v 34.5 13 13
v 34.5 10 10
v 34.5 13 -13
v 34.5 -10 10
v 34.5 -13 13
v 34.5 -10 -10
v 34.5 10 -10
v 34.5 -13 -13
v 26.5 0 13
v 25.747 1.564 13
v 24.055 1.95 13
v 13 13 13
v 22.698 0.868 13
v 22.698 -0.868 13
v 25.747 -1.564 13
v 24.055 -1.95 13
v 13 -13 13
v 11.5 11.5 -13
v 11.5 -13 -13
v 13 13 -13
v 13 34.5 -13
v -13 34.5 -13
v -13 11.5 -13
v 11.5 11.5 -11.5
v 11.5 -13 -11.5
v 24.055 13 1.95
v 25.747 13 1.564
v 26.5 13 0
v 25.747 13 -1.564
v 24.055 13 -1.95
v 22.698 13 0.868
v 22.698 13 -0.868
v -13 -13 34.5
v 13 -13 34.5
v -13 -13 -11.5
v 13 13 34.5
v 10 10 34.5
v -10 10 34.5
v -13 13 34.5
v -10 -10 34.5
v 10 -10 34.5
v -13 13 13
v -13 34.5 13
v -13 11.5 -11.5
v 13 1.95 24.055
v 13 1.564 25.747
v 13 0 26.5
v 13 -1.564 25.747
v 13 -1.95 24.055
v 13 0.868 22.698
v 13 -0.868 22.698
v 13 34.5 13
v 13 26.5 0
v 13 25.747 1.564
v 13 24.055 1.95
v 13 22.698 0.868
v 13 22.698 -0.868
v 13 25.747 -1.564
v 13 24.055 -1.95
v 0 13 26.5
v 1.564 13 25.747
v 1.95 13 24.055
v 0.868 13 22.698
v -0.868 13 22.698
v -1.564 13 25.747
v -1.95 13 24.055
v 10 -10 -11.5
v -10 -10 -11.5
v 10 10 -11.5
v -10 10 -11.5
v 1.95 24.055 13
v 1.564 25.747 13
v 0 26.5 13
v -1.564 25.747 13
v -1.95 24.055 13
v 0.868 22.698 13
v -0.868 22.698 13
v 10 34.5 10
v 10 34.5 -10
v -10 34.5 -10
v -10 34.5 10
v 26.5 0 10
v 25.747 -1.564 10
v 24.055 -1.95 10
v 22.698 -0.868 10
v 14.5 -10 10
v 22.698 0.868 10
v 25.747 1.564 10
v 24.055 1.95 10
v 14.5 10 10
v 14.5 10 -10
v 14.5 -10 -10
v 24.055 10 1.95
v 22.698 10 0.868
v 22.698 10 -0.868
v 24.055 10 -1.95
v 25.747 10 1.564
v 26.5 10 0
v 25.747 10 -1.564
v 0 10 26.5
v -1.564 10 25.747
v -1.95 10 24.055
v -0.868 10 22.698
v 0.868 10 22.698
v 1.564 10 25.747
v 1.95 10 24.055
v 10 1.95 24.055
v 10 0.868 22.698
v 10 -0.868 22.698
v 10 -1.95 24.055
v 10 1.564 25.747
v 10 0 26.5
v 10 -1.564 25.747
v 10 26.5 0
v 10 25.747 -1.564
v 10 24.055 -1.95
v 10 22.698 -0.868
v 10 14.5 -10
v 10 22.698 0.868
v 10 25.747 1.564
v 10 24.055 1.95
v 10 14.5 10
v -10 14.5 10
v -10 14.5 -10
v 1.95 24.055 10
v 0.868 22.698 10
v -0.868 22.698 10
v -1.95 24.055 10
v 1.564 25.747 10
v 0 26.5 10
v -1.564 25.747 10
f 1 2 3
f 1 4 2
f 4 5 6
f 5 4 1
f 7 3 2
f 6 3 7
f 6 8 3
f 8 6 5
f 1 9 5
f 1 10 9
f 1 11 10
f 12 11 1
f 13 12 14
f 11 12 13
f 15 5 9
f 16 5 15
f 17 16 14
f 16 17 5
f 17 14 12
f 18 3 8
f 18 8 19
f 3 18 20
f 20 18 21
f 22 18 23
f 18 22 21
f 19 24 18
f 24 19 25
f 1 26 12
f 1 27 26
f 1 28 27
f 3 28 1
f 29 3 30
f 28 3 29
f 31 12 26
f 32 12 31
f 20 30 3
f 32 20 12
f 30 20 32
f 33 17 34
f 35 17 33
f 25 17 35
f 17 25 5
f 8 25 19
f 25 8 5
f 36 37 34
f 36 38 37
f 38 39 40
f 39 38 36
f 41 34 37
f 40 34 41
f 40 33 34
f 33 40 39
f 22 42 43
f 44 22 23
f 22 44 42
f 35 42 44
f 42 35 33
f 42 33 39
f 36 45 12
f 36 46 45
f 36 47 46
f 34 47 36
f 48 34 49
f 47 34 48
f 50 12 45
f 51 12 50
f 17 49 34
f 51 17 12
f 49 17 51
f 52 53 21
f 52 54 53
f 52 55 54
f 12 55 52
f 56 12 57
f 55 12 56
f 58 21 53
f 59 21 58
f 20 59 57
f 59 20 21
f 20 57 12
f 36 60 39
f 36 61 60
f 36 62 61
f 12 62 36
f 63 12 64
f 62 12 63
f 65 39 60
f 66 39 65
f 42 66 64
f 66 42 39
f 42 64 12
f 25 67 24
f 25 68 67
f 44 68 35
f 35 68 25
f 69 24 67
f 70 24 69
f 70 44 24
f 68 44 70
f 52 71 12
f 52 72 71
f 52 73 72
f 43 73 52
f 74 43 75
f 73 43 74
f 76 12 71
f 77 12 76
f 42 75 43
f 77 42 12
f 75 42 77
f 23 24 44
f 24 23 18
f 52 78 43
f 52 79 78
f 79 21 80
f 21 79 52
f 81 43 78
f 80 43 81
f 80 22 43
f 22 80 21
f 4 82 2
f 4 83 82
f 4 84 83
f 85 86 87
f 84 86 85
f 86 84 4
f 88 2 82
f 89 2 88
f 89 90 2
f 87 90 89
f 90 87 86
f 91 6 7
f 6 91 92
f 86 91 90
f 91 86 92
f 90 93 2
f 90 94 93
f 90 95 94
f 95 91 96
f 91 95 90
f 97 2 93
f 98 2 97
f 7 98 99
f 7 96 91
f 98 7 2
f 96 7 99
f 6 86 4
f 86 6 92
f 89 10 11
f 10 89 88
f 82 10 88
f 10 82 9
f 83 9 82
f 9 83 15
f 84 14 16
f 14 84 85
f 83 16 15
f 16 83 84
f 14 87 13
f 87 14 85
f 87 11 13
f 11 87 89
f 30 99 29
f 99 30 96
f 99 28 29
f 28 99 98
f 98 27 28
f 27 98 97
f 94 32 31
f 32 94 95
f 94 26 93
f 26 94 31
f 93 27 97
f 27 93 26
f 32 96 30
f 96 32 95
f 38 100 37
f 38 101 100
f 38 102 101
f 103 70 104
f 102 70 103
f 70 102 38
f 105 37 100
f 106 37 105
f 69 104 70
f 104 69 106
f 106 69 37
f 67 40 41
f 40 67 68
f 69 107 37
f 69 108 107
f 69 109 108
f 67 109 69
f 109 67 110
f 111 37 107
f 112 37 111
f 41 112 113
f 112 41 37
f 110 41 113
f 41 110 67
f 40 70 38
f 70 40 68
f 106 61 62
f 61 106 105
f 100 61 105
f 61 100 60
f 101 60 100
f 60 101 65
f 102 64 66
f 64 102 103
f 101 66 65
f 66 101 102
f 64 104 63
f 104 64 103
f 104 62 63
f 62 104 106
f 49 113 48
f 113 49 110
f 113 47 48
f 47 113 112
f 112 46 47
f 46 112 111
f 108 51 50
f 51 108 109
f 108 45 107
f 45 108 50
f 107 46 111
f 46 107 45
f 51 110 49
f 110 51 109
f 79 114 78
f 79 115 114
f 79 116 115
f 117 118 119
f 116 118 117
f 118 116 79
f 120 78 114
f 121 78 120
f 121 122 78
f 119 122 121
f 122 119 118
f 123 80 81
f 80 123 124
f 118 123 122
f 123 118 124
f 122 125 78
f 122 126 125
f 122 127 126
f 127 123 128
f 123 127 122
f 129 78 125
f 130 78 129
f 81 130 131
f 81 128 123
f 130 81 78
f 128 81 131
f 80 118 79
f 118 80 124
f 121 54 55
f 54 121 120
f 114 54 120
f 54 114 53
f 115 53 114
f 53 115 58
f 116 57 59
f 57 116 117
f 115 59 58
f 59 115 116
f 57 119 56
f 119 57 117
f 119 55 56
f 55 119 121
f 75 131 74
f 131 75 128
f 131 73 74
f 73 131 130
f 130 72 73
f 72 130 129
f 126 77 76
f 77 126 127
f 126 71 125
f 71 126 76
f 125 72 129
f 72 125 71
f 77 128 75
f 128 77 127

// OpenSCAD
// file: veriables.scad
aluminum_width			= 20;
wall_thickness			= 3;
depth						= 20;
smooth_rod				= 10;
long_bearing_od			= 19;
long_bearing_length		= 29;
bearing_outer			= 22;
bearing_inner			= 8;
bearing_thick				= 7;
screw_diamiter			= 4;
motor_width				= 42.5;
motor_screw_space		= 31;

hotend_gap				= 6;
hotend_gap_dia			= 12;
hotend_top				= 3;
hotend_top_dia			= 16;

x_rod_spacing			= 60;

aluminum_plate_thick	= 3;
// main file
include <veriables.scad>;

module block(){
	translate([depth+wall_thickness,0,0]) cube([depth+wall_thickness,aluminum_width+(wall_thickness*2),aluminum_width+(wall_thickness*2)], center=true);
}

module taken(){
	module something(){
		cube([depth,aluminum_width,aluminum_width], center=true);
		cylinder(h=30, d=4);
		rotate([-90,0,0]) cylinder(h=30, d=4);
		translate([0,0,aluminum_width])  cylinder(h=30, d=8);
		rotate([-90,0,0]) translate([0,0,aluminum_width]) cylinder(h=30, d=8);
	}
	translate([wall_thickness/2+depth+wall_thickness,0,0]) something();
}

difference(){
	union(){
		block();
		rotate([0,-90,0]) block();
		translate([0,0,-wall_thickness-depth]) rotate([0,-90,0]) block();
		rotate([0,0,90]) block();
	}
taken();
rotate([-90,-90,0]) taken();
rotate([90,0,90]) taken();
rotate([90,-90,0]) cube([depth*5,aluminum_width,aluminum_width], center=true);
}
